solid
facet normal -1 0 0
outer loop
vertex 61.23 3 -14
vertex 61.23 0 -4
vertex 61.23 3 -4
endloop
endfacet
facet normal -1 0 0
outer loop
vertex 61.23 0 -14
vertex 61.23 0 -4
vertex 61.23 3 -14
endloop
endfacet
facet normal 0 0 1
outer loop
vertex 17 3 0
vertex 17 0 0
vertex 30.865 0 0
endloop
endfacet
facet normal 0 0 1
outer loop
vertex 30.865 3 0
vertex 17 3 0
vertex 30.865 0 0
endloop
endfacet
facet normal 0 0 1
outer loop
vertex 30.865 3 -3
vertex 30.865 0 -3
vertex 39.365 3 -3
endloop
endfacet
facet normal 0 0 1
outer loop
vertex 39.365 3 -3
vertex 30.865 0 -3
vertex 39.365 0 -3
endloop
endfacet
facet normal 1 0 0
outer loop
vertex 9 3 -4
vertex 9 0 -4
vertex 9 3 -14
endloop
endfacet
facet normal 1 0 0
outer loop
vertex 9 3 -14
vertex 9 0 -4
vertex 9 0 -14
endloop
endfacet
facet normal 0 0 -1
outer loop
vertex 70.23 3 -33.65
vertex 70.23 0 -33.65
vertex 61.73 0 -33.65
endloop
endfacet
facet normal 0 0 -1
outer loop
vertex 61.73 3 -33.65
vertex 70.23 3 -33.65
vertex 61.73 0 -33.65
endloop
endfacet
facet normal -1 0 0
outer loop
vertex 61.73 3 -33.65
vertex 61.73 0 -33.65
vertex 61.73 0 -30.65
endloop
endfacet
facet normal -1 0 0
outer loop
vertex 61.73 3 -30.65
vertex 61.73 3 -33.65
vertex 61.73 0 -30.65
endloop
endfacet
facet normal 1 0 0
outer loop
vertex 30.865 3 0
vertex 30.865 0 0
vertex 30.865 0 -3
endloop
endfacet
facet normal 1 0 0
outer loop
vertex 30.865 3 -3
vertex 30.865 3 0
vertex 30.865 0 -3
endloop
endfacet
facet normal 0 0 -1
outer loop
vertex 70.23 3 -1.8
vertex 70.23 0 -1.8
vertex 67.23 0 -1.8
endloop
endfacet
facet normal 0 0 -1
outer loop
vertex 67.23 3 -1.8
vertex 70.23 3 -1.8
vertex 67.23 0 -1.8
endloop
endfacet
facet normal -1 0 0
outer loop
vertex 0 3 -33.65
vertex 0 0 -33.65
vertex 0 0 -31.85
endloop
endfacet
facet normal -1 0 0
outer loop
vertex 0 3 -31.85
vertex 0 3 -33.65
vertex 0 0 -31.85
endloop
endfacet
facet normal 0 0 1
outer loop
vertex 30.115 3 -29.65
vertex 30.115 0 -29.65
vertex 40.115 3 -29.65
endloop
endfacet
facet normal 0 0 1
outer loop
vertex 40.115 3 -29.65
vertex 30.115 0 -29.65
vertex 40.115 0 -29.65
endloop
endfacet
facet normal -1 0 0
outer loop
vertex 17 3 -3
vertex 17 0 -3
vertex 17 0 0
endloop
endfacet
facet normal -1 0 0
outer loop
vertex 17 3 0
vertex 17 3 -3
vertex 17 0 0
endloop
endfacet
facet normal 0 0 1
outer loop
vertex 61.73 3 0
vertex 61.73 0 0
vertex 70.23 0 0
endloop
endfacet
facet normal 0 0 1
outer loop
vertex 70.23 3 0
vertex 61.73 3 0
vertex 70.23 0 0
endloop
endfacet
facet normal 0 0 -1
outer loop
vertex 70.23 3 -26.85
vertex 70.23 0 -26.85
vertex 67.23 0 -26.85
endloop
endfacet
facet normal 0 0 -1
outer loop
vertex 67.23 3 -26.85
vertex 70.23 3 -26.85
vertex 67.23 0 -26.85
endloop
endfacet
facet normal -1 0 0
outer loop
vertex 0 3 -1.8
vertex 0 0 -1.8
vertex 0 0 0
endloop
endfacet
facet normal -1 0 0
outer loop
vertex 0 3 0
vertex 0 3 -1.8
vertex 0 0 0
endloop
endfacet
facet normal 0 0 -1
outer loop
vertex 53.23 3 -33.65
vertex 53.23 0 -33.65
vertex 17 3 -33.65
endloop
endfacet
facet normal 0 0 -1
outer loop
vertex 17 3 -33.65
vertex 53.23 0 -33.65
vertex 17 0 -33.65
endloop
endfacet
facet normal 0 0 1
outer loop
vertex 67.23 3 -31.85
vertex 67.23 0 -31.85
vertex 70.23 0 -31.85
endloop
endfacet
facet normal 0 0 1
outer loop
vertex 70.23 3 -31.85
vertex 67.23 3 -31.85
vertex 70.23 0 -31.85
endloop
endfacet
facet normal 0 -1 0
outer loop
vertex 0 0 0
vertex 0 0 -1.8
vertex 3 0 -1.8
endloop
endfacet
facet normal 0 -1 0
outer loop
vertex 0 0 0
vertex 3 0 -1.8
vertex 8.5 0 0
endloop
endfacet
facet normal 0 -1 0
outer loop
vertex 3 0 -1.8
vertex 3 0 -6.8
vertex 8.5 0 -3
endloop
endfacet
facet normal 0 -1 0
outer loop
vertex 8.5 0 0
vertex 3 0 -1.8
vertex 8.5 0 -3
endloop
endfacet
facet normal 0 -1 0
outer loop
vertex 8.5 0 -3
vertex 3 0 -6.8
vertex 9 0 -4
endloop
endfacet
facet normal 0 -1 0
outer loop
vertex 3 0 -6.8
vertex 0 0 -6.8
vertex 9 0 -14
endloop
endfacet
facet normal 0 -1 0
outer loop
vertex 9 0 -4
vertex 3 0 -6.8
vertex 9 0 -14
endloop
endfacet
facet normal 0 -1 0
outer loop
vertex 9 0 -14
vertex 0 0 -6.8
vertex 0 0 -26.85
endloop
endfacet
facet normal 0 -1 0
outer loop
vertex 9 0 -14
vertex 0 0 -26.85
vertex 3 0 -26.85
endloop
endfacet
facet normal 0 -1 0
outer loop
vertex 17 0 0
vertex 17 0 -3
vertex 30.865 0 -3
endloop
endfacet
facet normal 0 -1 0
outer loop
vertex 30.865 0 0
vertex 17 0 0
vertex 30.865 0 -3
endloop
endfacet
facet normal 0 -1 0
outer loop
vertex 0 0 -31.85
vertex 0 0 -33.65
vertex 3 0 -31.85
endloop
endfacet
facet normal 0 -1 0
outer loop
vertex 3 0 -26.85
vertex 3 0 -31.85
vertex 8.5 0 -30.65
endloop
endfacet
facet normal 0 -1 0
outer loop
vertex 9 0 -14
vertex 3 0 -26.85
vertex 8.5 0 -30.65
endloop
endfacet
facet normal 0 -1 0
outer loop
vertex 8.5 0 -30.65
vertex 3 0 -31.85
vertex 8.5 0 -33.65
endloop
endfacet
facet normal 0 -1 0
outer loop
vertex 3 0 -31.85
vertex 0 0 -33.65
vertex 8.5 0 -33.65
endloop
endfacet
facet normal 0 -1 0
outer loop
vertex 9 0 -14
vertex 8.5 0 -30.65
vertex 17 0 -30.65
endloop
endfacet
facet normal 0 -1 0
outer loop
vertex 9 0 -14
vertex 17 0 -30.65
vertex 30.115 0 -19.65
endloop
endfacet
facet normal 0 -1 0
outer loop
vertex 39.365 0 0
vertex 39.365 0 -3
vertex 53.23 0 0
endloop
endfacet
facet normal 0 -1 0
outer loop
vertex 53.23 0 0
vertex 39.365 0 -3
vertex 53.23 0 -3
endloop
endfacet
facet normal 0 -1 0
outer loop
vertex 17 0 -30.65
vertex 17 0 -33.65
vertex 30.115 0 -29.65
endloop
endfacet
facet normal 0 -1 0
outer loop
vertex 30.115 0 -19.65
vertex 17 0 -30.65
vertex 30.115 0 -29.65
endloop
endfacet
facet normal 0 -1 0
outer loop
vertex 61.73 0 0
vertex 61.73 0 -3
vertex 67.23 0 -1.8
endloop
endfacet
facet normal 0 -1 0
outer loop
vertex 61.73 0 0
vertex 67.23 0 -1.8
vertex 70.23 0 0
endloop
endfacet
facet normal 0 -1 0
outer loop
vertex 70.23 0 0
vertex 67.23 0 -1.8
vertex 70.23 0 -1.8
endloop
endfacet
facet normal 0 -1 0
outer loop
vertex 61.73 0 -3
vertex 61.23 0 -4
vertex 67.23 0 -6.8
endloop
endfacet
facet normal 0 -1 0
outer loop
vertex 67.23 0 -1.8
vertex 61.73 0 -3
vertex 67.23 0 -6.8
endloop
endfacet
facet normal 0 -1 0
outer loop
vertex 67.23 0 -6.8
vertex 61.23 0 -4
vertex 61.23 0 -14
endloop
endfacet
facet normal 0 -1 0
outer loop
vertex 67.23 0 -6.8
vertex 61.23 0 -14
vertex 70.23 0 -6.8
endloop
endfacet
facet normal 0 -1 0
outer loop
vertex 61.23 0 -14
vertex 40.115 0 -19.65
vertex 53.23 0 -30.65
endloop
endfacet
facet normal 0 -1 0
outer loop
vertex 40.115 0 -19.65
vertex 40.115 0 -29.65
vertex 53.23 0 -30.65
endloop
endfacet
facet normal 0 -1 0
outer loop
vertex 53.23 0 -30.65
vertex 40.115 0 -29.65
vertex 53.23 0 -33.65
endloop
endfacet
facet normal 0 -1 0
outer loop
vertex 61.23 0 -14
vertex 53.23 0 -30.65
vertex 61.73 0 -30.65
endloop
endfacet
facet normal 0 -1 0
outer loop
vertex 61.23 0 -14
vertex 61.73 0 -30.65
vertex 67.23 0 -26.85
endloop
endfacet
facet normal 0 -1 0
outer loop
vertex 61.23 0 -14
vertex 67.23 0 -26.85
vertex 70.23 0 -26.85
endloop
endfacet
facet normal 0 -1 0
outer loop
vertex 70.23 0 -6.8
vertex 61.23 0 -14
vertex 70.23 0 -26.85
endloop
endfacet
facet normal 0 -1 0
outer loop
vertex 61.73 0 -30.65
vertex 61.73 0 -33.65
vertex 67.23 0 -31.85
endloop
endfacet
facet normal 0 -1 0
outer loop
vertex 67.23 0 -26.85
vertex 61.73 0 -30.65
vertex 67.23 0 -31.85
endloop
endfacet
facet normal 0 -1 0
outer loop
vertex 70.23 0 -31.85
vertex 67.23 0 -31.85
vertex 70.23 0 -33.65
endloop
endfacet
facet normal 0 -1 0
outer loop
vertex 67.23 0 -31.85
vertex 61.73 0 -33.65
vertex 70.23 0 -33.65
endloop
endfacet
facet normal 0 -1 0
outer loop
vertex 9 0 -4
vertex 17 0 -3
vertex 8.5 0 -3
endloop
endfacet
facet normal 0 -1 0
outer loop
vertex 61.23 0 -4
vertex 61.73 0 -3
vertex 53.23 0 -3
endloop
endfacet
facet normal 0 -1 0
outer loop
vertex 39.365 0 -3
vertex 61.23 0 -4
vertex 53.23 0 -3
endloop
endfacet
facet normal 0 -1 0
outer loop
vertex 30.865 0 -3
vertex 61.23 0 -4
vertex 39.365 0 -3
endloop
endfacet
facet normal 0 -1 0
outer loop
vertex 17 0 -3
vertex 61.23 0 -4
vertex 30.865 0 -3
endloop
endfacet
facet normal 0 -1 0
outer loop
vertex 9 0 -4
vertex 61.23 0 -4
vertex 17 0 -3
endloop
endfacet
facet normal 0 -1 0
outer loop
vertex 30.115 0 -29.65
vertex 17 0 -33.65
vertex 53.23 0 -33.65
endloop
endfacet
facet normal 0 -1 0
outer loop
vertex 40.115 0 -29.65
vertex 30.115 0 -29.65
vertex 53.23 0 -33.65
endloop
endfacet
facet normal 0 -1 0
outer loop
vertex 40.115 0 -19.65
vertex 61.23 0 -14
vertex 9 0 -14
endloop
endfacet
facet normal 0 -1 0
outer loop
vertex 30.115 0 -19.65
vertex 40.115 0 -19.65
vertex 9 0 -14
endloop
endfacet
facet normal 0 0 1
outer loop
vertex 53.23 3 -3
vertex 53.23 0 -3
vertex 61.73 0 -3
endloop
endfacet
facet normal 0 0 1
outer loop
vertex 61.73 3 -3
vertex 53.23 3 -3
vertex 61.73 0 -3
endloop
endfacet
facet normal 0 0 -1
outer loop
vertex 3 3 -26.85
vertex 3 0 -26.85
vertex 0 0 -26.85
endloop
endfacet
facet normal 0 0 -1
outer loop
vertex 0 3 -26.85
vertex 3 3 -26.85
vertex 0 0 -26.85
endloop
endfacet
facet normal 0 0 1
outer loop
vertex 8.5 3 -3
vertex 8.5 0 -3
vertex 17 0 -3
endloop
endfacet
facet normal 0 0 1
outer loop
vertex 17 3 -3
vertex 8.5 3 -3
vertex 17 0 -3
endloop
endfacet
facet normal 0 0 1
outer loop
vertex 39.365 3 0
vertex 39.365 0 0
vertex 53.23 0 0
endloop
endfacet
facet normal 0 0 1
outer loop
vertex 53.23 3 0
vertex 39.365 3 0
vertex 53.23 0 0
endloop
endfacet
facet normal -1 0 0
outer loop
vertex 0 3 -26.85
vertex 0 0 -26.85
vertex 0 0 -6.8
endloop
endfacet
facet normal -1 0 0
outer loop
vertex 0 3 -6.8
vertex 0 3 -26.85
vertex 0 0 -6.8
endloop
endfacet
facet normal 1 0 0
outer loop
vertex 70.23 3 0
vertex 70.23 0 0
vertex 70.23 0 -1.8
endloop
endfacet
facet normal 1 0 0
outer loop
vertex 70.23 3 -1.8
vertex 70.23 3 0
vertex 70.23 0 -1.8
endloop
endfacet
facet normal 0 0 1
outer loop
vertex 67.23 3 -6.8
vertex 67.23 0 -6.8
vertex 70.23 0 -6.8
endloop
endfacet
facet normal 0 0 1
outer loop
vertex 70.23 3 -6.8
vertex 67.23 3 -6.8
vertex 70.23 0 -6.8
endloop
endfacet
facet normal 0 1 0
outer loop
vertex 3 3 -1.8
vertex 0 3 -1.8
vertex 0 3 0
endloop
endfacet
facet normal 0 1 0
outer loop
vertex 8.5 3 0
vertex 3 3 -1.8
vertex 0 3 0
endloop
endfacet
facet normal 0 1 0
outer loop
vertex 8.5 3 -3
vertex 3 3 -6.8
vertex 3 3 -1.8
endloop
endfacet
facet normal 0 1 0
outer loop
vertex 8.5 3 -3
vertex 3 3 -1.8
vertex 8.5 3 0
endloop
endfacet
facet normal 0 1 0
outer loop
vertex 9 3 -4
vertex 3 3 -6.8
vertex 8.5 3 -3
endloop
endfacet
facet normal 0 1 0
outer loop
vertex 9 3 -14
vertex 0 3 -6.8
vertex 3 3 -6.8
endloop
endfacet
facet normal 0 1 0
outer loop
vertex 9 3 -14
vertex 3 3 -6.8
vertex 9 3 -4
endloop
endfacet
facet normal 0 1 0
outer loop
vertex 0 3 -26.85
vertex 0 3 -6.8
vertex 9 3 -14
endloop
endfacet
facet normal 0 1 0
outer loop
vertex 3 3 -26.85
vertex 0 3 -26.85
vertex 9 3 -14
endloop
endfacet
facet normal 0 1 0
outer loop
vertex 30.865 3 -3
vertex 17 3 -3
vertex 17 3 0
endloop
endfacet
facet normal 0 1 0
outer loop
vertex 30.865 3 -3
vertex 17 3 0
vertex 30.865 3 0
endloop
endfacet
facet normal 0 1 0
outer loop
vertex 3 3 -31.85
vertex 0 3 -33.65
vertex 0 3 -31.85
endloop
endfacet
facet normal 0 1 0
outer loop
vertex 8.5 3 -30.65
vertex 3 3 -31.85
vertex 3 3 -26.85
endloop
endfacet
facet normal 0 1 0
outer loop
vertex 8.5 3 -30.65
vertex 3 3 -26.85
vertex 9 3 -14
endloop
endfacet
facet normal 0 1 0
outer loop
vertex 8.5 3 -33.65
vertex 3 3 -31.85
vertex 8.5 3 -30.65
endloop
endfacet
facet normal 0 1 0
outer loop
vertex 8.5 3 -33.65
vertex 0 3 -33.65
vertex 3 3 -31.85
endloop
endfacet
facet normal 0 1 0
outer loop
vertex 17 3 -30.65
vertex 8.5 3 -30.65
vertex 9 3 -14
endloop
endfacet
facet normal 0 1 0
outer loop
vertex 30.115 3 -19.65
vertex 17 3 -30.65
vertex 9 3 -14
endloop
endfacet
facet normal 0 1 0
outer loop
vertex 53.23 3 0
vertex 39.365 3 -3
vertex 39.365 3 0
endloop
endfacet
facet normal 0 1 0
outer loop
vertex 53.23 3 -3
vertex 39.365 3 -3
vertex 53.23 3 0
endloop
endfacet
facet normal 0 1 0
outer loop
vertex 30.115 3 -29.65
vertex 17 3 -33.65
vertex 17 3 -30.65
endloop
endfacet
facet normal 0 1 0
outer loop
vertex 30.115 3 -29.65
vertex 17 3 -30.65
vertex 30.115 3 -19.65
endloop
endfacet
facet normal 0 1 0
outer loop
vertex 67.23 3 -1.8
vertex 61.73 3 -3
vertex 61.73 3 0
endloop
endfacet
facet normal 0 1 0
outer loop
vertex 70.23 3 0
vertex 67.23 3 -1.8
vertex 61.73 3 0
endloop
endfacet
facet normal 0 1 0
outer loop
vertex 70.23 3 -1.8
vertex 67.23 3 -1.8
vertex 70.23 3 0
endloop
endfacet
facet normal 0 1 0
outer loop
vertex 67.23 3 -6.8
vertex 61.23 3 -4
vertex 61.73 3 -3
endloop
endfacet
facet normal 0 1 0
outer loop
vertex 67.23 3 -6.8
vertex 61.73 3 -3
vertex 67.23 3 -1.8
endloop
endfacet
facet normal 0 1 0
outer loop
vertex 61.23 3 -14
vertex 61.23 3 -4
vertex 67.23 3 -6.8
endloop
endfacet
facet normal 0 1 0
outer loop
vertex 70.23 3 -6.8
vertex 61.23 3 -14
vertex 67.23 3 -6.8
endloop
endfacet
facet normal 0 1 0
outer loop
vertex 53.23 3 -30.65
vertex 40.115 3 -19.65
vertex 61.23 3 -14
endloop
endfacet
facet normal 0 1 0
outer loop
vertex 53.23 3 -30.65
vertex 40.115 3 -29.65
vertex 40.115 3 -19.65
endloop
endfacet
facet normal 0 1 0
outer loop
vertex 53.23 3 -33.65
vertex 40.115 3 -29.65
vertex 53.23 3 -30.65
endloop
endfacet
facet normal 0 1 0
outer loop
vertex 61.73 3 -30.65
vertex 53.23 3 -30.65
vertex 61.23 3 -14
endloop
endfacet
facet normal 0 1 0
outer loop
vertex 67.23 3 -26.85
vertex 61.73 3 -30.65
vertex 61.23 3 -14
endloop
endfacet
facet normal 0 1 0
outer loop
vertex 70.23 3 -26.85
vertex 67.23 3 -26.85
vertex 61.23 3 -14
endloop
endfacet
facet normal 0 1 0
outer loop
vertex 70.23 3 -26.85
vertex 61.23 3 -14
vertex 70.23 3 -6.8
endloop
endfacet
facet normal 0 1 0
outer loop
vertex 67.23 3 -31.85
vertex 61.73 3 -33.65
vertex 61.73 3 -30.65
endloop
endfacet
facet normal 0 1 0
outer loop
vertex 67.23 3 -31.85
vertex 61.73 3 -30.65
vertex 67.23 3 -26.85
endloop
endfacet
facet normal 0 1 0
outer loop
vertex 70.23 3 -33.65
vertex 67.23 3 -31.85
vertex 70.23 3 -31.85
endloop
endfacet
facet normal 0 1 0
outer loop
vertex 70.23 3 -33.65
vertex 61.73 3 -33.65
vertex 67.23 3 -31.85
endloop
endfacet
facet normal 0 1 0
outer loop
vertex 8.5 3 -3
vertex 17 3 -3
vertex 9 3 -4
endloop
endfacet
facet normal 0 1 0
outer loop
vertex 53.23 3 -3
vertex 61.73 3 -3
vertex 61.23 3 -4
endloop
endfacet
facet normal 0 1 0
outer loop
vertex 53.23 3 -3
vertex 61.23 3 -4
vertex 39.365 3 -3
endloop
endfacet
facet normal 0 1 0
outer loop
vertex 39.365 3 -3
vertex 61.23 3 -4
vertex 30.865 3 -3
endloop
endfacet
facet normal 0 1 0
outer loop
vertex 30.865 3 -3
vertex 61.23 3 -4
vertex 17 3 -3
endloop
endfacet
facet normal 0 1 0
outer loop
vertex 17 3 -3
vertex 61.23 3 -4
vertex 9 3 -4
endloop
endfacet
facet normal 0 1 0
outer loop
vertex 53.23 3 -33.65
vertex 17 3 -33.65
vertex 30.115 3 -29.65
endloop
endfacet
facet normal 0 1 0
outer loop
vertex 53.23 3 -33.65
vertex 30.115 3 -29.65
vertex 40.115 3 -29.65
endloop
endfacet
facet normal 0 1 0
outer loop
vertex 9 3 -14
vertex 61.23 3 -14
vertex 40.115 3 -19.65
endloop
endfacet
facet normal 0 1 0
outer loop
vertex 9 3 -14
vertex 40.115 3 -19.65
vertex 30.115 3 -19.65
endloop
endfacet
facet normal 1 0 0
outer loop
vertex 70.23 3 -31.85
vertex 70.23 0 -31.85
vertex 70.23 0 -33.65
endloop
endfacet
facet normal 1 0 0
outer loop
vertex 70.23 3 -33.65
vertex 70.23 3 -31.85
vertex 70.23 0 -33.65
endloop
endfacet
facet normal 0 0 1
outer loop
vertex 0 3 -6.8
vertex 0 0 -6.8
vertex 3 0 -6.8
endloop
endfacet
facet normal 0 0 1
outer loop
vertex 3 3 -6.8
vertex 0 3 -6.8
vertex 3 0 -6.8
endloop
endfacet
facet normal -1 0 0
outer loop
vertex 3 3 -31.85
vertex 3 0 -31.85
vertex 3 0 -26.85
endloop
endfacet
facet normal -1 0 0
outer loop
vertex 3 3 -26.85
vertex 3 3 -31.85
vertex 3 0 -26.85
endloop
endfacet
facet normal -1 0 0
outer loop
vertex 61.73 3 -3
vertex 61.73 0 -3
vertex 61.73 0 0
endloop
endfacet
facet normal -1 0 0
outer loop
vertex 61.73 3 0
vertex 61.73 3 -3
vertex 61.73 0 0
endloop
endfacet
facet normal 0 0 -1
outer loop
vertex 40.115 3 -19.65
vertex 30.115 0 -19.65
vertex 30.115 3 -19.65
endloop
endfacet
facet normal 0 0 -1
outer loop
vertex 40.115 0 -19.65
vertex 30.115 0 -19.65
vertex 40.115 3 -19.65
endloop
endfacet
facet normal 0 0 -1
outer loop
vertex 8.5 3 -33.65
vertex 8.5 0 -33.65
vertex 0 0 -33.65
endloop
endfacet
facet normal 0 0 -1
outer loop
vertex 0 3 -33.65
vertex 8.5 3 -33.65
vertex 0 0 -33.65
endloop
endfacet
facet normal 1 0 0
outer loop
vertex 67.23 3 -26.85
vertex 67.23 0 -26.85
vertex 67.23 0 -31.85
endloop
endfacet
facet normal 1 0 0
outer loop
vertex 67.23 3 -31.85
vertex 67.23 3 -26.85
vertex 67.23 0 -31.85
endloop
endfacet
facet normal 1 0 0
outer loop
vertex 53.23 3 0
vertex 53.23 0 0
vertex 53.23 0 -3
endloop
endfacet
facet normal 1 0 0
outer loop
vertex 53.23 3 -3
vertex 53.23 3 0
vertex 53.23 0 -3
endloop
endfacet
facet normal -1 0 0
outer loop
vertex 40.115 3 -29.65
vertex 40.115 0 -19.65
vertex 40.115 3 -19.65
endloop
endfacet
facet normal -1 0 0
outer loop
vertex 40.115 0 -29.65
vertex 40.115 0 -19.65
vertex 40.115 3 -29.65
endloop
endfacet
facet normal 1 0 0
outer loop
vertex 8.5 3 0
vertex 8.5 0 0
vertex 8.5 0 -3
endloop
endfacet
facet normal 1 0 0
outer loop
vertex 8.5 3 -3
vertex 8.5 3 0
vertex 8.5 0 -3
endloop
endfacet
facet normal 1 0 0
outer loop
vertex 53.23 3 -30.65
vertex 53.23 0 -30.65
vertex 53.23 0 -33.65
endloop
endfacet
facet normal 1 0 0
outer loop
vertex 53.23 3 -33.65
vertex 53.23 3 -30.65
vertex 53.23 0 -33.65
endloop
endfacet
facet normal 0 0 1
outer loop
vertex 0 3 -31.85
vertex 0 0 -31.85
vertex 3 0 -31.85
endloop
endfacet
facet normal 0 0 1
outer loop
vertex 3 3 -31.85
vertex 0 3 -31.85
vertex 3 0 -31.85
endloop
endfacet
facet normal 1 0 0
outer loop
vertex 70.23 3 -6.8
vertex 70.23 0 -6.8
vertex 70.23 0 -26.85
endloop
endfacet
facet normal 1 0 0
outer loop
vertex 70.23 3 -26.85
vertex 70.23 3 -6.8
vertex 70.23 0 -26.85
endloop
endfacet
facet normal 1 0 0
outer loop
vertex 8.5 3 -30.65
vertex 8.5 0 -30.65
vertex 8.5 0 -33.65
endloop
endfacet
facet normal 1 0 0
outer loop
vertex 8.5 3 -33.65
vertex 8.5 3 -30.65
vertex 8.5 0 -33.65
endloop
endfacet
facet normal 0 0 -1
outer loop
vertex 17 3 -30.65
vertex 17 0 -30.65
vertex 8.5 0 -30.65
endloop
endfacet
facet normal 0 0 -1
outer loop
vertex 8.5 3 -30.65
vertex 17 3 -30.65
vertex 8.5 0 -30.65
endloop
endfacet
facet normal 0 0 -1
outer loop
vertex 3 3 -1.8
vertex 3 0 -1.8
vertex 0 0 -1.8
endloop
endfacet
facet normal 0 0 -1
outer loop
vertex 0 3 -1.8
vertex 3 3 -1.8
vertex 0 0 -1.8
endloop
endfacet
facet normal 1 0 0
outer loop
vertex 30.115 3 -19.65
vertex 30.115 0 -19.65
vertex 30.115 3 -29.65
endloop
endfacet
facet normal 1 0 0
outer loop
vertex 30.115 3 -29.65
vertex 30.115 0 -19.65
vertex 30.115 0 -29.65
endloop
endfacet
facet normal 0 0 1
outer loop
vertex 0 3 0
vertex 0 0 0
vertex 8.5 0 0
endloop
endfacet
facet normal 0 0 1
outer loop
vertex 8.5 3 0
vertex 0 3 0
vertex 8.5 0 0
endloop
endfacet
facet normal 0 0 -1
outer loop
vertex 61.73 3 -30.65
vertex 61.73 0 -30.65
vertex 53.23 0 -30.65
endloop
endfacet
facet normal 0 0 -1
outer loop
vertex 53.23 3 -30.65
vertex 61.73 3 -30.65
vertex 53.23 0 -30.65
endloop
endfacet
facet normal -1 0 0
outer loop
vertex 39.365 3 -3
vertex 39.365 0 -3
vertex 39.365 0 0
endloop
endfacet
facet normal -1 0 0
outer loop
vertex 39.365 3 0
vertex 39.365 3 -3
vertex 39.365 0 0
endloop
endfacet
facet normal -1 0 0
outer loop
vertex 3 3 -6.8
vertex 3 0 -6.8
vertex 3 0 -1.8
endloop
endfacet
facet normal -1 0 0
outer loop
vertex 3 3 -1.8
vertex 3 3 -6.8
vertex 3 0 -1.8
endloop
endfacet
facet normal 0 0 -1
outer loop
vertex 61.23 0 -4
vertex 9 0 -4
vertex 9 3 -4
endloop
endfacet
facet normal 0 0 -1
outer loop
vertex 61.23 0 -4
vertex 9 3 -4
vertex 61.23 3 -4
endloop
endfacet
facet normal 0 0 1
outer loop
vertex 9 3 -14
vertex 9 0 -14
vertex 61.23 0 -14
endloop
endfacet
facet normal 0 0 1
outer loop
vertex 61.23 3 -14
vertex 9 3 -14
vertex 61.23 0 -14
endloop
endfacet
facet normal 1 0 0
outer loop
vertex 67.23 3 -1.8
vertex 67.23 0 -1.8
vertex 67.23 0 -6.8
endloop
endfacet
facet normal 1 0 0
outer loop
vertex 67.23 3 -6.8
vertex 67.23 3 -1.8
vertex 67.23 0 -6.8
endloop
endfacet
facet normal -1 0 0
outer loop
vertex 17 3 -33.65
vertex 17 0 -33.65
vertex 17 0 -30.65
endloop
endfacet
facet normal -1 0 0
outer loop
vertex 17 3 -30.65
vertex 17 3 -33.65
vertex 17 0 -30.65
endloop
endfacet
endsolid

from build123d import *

# Parameters (mm, degrees)
CROQUIS1_W              = 52.23
CROQUIS1_H              = 10
CROQUIS1_W_2            = 10
SALIENTE_EXTRUIR1_DEPTH = 3


with BuildPart() as part:
    # Croquis1 → Saliente-Extruir1 (new body)
    with BuildSketch(Plane(origin=(0, 0, 0), x_dir=(1, 0, 0), z_dir=(0, 1, 0))):
        Polygon((17, 33.65), (17, 30.65), (8.5, 30.65), (8.5, 33.65), (0, 33.65), (0, 31.85), (3, 31.85), (3, 26.85), (0, 26.85), (0, 6.8), (3, 6.8), (3, 1.8), (0, 1.8), (0, 0), (8.5, 0), (8.5, 3), (17, 3), (17, 0), (30.865, 0), (30.865, 3), (39.365, 3), (39.365, 0), (53.23, 0), (53.23, 3), (61.73, 3), (61.73, 0), (70.23, 0), (70.23, 1.8), (67.23, 1.8), (67.23, 6.8), (70.23, 6.8), (70.23, 26.85), (67.23, 26.85), (67.23, 31.85), (70.23, 31.85), (70.23, 33.65), (61.73, 33.65), (61.73, 30.65), (53.23, 30.65), (53.23, 33.65), align=None)
        with Locations((35.115, 9)):
            Rectangle(CROQUIS1_W, CROQUIS1_H, mode=Mode.SUBTRACT)
        with Locations((35.115, 24.65)):
            Rectangle(CROQUIS1_W_2, CROQUIS1_H, mode=Mode.SUBTRACT)
    extrude(amount=SALIENTE_EXTRUIR1_DEPTH)


solid = part.part
